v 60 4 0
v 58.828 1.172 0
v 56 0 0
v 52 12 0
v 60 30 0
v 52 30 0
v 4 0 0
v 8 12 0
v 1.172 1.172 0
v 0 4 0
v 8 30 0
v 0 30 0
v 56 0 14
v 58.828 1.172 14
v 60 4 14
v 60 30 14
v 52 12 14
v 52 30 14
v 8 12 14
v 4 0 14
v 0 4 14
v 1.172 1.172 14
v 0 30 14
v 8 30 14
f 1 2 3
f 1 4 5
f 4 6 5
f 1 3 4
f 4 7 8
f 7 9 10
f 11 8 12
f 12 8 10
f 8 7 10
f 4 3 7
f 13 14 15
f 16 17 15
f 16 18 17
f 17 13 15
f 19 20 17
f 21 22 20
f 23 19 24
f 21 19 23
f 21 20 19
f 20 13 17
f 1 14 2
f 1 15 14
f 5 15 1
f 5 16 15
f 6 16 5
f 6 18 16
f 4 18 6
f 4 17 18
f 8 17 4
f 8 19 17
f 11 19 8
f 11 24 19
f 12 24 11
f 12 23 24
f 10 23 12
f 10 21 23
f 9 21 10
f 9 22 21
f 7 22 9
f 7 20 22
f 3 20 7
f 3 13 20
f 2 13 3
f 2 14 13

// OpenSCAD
$fn = 32;
// ----------------------------------------------------------------------
// Heat sink frame: 60 x 30 mm frame, 8 mm walls
// ----------------------------------------------------------------------

// --- parameters (mm) ---
profile_height = 14;      // extrusion height
profile_points = 12;      // points of the closed outline

profile = [[0, 4], [1.172, 1.172], [4, 0], [56, 0], [58.828, 1.172], [60, 4], [60, 30], [52, 30], [52, 12], [8, 12], [8, 30], [0, 30]];  // single closed polygon, 12 points, counter clockwise

// --- the one profile operation ---
linear_extrude(height = profile_height) polygon(points = profile);
